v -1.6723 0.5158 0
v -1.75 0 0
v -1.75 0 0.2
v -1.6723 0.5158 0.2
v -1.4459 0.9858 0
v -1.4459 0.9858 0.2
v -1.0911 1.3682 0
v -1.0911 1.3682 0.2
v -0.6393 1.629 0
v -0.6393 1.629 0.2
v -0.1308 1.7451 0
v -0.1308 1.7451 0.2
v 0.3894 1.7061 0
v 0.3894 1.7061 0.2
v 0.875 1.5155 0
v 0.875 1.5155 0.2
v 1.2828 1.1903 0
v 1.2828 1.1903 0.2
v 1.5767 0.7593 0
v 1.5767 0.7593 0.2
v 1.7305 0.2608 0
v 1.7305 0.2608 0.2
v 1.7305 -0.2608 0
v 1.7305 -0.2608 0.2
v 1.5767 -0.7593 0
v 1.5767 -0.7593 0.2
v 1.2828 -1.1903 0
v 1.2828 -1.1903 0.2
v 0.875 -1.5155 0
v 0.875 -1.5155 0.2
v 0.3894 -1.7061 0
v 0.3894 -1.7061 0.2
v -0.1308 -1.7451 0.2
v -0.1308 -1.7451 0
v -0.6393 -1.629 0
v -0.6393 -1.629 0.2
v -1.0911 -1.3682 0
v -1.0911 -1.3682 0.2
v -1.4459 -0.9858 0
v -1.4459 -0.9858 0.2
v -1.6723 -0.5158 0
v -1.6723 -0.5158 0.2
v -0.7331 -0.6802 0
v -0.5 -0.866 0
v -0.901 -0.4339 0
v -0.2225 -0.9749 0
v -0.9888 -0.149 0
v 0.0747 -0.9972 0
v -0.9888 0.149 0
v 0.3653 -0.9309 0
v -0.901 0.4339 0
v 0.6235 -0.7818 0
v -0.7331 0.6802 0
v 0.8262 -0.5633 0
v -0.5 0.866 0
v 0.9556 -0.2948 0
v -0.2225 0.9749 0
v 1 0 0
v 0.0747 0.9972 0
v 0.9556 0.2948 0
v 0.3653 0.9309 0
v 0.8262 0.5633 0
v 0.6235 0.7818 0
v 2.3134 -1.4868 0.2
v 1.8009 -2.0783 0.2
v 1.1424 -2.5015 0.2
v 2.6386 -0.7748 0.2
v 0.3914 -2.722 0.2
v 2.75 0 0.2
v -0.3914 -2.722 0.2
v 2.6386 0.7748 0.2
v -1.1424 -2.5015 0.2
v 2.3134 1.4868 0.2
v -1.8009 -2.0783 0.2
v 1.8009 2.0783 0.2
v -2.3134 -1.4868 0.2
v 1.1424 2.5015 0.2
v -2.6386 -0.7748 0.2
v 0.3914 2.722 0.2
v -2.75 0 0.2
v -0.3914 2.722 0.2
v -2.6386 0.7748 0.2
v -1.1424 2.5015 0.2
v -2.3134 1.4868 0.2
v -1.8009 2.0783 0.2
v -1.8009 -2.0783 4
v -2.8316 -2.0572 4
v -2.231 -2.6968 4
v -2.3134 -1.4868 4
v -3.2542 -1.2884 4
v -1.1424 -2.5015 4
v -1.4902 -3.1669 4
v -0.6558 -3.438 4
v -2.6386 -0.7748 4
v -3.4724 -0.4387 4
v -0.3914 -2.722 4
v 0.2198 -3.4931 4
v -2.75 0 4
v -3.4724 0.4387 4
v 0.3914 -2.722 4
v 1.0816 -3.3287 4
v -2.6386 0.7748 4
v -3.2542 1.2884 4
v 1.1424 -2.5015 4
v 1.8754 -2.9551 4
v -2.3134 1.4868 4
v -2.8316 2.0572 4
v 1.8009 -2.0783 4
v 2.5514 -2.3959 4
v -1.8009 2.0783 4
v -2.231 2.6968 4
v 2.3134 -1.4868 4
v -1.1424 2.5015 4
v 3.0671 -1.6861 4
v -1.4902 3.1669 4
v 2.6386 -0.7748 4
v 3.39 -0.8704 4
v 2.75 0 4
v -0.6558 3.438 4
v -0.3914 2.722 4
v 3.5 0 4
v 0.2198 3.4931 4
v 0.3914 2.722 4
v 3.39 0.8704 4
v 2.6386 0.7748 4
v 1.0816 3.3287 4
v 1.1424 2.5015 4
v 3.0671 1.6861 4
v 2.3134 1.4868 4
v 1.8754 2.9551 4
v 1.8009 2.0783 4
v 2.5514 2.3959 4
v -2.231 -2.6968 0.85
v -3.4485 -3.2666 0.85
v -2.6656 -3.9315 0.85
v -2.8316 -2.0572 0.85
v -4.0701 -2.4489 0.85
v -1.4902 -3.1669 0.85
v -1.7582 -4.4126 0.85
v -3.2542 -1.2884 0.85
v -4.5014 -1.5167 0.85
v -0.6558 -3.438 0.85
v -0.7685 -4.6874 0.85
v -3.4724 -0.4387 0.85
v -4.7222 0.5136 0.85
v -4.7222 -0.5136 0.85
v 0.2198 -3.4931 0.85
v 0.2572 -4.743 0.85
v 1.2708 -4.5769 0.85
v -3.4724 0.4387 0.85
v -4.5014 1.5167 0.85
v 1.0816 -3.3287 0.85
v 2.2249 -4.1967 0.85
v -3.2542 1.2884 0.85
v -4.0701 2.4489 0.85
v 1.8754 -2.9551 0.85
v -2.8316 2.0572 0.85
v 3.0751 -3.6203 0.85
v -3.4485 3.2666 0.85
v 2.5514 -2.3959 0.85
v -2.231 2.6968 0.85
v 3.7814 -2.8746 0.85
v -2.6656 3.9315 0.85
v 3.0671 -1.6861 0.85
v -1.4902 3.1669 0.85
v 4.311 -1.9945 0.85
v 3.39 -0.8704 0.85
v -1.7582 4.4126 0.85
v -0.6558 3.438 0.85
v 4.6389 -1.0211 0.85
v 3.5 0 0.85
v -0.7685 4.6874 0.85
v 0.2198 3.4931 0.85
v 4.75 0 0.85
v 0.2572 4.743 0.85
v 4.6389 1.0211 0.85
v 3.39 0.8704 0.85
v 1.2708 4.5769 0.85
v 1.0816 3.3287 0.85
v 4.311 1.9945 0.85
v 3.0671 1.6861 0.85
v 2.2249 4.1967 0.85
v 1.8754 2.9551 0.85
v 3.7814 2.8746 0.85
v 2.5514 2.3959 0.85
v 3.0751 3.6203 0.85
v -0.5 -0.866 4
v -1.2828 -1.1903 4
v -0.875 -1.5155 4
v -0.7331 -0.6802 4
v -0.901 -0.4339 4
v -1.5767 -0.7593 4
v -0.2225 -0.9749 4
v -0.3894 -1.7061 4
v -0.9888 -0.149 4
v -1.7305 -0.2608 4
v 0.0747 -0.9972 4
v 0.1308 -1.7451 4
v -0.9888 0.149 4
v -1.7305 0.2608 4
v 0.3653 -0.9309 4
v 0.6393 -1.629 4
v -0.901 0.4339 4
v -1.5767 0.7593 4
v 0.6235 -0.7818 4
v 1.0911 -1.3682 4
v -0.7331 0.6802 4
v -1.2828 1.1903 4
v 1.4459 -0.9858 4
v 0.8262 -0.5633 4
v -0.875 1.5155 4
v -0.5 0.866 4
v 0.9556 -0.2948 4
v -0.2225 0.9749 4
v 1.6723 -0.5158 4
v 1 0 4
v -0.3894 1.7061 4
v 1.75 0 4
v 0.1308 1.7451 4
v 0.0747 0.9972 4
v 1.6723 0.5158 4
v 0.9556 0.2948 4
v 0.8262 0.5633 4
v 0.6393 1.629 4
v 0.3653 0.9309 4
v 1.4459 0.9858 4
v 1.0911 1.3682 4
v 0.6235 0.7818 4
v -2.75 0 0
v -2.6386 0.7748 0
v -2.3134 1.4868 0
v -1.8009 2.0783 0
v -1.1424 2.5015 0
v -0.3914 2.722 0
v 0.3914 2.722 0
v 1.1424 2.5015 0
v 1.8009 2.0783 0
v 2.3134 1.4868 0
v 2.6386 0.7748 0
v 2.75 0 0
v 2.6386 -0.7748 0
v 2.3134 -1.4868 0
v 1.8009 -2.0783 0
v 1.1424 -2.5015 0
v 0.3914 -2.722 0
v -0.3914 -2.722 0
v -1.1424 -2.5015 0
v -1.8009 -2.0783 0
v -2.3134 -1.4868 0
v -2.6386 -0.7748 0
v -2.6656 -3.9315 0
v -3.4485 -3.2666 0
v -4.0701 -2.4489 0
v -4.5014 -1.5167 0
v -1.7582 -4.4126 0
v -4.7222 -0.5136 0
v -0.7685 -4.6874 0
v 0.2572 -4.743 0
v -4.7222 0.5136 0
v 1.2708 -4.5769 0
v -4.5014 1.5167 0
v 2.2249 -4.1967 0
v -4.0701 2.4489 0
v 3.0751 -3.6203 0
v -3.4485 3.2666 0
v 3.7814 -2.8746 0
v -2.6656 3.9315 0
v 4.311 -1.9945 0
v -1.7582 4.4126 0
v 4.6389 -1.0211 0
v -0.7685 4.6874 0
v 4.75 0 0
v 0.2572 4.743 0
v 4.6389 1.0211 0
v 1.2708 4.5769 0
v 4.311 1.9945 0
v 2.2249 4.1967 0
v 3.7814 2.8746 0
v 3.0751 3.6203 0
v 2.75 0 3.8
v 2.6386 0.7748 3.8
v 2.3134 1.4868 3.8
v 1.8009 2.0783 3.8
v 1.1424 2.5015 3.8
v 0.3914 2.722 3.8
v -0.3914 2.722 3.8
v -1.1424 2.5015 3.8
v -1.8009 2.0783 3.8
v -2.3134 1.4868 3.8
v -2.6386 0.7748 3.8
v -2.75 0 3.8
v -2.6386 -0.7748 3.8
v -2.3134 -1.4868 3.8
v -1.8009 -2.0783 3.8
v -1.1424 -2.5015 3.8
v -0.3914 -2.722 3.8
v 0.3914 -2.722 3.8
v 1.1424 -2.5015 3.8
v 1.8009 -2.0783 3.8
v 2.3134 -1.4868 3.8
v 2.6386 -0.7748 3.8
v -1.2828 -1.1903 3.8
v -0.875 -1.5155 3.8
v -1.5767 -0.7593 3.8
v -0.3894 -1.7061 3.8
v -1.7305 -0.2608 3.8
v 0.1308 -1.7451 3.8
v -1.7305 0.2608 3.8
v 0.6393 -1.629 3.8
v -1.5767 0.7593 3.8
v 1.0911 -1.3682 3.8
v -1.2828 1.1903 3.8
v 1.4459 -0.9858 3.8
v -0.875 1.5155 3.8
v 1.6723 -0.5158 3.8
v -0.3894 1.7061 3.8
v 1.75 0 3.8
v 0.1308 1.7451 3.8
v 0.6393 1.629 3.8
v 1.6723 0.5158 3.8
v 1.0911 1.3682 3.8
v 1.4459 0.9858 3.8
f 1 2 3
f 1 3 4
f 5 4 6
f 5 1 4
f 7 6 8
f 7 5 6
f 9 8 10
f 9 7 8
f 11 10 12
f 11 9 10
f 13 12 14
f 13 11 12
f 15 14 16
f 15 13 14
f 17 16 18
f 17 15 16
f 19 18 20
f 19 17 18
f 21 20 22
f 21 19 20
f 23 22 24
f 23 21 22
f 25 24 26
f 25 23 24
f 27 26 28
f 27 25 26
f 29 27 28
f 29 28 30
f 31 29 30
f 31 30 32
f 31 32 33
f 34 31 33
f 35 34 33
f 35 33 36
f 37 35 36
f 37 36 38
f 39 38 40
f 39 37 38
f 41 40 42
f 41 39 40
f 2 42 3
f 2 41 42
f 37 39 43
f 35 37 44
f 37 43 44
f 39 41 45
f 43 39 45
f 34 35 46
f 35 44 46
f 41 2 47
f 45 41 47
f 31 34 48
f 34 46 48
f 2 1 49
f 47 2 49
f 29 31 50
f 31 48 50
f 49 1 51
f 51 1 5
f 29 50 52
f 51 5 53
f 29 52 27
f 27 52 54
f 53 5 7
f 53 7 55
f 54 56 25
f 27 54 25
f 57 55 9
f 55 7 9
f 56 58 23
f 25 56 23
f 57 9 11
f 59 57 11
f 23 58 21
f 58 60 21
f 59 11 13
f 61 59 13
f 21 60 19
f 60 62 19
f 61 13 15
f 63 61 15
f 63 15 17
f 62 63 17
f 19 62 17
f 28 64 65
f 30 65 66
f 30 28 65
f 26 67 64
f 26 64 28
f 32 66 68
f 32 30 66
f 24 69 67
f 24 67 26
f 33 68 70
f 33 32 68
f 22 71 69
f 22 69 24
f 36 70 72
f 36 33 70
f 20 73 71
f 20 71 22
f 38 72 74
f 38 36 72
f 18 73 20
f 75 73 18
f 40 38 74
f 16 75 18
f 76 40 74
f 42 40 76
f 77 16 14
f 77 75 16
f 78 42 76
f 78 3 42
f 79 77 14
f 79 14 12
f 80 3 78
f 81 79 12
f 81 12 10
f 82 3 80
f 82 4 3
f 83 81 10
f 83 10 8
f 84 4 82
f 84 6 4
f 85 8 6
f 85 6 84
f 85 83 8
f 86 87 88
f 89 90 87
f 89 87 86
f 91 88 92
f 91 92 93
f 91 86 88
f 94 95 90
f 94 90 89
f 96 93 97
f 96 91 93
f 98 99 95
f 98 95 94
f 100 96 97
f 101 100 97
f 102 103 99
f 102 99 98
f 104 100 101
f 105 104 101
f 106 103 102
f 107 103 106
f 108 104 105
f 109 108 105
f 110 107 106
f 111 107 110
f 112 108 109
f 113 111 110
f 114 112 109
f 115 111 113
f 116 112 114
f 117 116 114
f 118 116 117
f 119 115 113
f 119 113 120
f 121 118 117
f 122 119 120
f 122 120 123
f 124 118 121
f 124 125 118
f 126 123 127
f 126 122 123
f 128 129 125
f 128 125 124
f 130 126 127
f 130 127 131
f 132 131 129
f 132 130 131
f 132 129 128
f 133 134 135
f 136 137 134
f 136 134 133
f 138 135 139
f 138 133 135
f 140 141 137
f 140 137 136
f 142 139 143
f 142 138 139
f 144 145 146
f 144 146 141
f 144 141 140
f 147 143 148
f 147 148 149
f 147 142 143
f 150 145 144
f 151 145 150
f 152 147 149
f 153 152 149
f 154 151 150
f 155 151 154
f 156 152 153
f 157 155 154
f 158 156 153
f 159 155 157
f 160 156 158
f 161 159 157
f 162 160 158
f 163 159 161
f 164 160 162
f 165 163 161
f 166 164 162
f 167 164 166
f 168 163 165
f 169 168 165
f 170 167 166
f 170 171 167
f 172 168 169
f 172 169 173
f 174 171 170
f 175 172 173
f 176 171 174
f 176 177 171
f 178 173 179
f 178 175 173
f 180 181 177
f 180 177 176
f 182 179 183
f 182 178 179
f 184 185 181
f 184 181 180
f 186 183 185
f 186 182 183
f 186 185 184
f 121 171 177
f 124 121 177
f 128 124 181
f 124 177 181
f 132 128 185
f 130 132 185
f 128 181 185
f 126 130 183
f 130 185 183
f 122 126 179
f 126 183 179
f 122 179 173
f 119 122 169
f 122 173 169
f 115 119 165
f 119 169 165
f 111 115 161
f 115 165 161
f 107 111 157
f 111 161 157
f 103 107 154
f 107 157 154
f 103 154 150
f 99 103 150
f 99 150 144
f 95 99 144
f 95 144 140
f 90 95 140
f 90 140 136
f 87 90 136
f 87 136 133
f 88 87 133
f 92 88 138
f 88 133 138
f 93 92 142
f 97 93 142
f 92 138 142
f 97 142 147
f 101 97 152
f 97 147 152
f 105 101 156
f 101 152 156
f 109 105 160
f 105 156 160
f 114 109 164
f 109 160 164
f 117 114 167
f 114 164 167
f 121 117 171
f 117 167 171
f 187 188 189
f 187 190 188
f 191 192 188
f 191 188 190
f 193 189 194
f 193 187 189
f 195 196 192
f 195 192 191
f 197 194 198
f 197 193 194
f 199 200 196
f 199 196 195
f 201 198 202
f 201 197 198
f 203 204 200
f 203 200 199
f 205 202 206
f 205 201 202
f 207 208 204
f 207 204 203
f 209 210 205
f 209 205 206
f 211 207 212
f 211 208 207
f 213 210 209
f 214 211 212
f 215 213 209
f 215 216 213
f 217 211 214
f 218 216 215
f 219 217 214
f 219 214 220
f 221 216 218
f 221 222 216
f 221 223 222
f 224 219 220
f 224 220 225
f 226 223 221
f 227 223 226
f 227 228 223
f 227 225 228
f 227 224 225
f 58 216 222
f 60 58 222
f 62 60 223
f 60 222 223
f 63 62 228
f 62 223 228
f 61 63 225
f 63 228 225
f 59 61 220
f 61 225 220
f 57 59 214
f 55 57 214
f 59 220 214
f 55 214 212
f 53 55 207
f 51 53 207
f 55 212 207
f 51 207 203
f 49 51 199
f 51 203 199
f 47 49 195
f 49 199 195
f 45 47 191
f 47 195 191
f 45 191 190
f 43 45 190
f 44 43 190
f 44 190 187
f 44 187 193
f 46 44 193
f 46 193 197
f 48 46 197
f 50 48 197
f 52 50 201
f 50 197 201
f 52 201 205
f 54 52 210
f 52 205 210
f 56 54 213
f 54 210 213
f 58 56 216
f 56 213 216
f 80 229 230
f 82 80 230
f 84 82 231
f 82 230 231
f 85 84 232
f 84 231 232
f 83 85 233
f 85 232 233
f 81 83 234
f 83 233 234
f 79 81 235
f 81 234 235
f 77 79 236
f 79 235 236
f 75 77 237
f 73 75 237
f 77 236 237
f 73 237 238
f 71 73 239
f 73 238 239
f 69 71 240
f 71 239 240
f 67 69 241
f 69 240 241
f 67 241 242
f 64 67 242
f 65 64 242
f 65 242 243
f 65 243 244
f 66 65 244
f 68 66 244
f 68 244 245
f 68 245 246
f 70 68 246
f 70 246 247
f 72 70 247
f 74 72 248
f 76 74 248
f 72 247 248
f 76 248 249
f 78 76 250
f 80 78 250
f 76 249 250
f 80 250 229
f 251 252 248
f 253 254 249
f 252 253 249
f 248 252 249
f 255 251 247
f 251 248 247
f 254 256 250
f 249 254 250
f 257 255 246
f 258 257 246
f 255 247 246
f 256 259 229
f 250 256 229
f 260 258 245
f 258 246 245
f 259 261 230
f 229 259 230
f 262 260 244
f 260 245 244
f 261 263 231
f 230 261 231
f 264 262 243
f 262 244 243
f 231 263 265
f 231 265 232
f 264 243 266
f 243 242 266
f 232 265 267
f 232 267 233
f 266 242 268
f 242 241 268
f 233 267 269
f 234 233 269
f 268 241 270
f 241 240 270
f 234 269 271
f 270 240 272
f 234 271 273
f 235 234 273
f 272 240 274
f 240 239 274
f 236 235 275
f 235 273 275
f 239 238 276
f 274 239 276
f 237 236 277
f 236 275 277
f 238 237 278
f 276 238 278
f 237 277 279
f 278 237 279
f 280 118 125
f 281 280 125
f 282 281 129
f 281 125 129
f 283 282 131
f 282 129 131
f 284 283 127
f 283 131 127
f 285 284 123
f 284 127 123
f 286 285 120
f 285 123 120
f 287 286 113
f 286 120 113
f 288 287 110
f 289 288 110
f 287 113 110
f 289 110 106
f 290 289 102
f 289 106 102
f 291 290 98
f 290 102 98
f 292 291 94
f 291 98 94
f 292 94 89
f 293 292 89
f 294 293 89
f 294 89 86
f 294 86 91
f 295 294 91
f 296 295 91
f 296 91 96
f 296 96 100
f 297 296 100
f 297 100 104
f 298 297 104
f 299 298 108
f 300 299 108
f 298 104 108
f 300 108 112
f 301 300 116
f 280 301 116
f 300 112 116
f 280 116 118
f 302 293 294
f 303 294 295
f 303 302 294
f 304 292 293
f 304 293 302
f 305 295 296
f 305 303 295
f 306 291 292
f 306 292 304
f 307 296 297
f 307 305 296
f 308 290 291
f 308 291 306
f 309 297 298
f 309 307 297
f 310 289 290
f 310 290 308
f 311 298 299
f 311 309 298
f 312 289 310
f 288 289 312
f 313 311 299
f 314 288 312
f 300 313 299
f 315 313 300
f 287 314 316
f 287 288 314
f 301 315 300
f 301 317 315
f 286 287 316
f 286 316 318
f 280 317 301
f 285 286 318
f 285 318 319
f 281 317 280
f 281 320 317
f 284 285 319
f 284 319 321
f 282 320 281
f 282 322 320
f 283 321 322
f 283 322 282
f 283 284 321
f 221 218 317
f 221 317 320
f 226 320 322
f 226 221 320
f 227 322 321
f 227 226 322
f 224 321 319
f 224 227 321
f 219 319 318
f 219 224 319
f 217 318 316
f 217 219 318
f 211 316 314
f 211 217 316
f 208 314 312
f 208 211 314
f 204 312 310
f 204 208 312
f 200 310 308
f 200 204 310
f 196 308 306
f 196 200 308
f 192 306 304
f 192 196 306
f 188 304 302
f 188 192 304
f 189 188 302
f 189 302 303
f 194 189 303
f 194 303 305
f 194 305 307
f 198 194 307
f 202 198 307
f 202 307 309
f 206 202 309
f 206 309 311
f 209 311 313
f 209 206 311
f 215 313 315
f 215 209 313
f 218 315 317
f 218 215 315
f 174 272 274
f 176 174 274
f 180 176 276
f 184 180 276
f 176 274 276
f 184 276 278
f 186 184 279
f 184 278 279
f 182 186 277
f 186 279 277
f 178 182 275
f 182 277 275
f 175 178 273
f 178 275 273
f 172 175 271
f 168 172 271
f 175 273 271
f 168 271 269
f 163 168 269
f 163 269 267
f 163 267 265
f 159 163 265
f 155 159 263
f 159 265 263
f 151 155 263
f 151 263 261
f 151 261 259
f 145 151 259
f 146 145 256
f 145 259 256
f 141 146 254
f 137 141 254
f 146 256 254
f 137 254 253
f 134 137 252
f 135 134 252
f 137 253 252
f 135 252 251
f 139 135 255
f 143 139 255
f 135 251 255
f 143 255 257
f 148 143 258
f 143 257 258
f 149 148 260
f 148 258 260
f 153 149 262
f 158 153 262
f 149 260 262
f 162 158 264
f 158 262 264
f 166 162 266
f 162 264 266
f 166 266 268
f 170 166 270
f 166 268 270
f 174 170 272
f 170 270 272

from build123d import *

# Parameters (mm, degrees)
SKETCH1_R           = 4.75
BOSS_EXTRUDE1_DEPTH = 0.85
SKETCH3_R           = 3.5
BOSS_EXTRUDE3_DEPTH = 3.15
SKETCH4_R           = 1
CUT_EXTRUDE1_DEPTH  = 4
SKETCH5_R           = 2.75
SKETCH5_R_2         = 1.75
CUT_EXTRUDE2_DEPTH  = 0.2
CUT_EXTRUDE3_START  = -0.2
SKETCH6_R           = 2.75
SKETCH6_R_2         = 1.75
CUT_EXTRUDE3_DEPTH  = 0.2


with BuildPart() as part:
    # Sketch1 → Boss-Extrude1 (new body)
    with BuildSketch(Plane.XY):
        Circle(SKETCH1_R)
    extrude(amount=BOSS_EXTRUDE1_DEPTH)

    # Sketch3 → Boss-Extrude3 (add)
    with BuildSketch(Plane.XY.offset(0.85)):
        Circle(SKETCH3_R)
    extrude(amount=BOSS_EXTRUDE3_DEPTH)

    # Sketch4 → Cut-Extrude1 (cut)
    with BuildSketch(Plane.XY.offset(4)):
        Circle(SKETCH4_R)
    extrude(amount=-CUT_EXTRUDE1_DEPTH, mode=Mode.SUBTRACT)

    # Sketch5 → Cut-Extrude2 (cut)
    with BuildSketch(Plane.XY.offset(4)):
        Circle(SKETCH5_R)
        Circle(SKETCH5_R_2, mode=Mode.SUBTRACT)
    extrude(amount=-CUT_EXTRUDE2_DEPTH, mode=Mode.SUBTRACT)

    # Sketch6 → Cut-Extrude3 (cut)
    with BuildSketch(Plane(origin=(0, 0, 0), x_dir=(-1, 0, 0), z_dir=(0, 0, -1)).offset(CUT_EXTRUDE3_START)):
        Circle(SKETCH6_R)
        Circle(SKETCH6_R_2, mode=Mode.SUBTRACT)
    extrude(amount=CUT_EXTRUDE3_DEPTH, mode=Mode.SUBTRACT)


solid = part.part
